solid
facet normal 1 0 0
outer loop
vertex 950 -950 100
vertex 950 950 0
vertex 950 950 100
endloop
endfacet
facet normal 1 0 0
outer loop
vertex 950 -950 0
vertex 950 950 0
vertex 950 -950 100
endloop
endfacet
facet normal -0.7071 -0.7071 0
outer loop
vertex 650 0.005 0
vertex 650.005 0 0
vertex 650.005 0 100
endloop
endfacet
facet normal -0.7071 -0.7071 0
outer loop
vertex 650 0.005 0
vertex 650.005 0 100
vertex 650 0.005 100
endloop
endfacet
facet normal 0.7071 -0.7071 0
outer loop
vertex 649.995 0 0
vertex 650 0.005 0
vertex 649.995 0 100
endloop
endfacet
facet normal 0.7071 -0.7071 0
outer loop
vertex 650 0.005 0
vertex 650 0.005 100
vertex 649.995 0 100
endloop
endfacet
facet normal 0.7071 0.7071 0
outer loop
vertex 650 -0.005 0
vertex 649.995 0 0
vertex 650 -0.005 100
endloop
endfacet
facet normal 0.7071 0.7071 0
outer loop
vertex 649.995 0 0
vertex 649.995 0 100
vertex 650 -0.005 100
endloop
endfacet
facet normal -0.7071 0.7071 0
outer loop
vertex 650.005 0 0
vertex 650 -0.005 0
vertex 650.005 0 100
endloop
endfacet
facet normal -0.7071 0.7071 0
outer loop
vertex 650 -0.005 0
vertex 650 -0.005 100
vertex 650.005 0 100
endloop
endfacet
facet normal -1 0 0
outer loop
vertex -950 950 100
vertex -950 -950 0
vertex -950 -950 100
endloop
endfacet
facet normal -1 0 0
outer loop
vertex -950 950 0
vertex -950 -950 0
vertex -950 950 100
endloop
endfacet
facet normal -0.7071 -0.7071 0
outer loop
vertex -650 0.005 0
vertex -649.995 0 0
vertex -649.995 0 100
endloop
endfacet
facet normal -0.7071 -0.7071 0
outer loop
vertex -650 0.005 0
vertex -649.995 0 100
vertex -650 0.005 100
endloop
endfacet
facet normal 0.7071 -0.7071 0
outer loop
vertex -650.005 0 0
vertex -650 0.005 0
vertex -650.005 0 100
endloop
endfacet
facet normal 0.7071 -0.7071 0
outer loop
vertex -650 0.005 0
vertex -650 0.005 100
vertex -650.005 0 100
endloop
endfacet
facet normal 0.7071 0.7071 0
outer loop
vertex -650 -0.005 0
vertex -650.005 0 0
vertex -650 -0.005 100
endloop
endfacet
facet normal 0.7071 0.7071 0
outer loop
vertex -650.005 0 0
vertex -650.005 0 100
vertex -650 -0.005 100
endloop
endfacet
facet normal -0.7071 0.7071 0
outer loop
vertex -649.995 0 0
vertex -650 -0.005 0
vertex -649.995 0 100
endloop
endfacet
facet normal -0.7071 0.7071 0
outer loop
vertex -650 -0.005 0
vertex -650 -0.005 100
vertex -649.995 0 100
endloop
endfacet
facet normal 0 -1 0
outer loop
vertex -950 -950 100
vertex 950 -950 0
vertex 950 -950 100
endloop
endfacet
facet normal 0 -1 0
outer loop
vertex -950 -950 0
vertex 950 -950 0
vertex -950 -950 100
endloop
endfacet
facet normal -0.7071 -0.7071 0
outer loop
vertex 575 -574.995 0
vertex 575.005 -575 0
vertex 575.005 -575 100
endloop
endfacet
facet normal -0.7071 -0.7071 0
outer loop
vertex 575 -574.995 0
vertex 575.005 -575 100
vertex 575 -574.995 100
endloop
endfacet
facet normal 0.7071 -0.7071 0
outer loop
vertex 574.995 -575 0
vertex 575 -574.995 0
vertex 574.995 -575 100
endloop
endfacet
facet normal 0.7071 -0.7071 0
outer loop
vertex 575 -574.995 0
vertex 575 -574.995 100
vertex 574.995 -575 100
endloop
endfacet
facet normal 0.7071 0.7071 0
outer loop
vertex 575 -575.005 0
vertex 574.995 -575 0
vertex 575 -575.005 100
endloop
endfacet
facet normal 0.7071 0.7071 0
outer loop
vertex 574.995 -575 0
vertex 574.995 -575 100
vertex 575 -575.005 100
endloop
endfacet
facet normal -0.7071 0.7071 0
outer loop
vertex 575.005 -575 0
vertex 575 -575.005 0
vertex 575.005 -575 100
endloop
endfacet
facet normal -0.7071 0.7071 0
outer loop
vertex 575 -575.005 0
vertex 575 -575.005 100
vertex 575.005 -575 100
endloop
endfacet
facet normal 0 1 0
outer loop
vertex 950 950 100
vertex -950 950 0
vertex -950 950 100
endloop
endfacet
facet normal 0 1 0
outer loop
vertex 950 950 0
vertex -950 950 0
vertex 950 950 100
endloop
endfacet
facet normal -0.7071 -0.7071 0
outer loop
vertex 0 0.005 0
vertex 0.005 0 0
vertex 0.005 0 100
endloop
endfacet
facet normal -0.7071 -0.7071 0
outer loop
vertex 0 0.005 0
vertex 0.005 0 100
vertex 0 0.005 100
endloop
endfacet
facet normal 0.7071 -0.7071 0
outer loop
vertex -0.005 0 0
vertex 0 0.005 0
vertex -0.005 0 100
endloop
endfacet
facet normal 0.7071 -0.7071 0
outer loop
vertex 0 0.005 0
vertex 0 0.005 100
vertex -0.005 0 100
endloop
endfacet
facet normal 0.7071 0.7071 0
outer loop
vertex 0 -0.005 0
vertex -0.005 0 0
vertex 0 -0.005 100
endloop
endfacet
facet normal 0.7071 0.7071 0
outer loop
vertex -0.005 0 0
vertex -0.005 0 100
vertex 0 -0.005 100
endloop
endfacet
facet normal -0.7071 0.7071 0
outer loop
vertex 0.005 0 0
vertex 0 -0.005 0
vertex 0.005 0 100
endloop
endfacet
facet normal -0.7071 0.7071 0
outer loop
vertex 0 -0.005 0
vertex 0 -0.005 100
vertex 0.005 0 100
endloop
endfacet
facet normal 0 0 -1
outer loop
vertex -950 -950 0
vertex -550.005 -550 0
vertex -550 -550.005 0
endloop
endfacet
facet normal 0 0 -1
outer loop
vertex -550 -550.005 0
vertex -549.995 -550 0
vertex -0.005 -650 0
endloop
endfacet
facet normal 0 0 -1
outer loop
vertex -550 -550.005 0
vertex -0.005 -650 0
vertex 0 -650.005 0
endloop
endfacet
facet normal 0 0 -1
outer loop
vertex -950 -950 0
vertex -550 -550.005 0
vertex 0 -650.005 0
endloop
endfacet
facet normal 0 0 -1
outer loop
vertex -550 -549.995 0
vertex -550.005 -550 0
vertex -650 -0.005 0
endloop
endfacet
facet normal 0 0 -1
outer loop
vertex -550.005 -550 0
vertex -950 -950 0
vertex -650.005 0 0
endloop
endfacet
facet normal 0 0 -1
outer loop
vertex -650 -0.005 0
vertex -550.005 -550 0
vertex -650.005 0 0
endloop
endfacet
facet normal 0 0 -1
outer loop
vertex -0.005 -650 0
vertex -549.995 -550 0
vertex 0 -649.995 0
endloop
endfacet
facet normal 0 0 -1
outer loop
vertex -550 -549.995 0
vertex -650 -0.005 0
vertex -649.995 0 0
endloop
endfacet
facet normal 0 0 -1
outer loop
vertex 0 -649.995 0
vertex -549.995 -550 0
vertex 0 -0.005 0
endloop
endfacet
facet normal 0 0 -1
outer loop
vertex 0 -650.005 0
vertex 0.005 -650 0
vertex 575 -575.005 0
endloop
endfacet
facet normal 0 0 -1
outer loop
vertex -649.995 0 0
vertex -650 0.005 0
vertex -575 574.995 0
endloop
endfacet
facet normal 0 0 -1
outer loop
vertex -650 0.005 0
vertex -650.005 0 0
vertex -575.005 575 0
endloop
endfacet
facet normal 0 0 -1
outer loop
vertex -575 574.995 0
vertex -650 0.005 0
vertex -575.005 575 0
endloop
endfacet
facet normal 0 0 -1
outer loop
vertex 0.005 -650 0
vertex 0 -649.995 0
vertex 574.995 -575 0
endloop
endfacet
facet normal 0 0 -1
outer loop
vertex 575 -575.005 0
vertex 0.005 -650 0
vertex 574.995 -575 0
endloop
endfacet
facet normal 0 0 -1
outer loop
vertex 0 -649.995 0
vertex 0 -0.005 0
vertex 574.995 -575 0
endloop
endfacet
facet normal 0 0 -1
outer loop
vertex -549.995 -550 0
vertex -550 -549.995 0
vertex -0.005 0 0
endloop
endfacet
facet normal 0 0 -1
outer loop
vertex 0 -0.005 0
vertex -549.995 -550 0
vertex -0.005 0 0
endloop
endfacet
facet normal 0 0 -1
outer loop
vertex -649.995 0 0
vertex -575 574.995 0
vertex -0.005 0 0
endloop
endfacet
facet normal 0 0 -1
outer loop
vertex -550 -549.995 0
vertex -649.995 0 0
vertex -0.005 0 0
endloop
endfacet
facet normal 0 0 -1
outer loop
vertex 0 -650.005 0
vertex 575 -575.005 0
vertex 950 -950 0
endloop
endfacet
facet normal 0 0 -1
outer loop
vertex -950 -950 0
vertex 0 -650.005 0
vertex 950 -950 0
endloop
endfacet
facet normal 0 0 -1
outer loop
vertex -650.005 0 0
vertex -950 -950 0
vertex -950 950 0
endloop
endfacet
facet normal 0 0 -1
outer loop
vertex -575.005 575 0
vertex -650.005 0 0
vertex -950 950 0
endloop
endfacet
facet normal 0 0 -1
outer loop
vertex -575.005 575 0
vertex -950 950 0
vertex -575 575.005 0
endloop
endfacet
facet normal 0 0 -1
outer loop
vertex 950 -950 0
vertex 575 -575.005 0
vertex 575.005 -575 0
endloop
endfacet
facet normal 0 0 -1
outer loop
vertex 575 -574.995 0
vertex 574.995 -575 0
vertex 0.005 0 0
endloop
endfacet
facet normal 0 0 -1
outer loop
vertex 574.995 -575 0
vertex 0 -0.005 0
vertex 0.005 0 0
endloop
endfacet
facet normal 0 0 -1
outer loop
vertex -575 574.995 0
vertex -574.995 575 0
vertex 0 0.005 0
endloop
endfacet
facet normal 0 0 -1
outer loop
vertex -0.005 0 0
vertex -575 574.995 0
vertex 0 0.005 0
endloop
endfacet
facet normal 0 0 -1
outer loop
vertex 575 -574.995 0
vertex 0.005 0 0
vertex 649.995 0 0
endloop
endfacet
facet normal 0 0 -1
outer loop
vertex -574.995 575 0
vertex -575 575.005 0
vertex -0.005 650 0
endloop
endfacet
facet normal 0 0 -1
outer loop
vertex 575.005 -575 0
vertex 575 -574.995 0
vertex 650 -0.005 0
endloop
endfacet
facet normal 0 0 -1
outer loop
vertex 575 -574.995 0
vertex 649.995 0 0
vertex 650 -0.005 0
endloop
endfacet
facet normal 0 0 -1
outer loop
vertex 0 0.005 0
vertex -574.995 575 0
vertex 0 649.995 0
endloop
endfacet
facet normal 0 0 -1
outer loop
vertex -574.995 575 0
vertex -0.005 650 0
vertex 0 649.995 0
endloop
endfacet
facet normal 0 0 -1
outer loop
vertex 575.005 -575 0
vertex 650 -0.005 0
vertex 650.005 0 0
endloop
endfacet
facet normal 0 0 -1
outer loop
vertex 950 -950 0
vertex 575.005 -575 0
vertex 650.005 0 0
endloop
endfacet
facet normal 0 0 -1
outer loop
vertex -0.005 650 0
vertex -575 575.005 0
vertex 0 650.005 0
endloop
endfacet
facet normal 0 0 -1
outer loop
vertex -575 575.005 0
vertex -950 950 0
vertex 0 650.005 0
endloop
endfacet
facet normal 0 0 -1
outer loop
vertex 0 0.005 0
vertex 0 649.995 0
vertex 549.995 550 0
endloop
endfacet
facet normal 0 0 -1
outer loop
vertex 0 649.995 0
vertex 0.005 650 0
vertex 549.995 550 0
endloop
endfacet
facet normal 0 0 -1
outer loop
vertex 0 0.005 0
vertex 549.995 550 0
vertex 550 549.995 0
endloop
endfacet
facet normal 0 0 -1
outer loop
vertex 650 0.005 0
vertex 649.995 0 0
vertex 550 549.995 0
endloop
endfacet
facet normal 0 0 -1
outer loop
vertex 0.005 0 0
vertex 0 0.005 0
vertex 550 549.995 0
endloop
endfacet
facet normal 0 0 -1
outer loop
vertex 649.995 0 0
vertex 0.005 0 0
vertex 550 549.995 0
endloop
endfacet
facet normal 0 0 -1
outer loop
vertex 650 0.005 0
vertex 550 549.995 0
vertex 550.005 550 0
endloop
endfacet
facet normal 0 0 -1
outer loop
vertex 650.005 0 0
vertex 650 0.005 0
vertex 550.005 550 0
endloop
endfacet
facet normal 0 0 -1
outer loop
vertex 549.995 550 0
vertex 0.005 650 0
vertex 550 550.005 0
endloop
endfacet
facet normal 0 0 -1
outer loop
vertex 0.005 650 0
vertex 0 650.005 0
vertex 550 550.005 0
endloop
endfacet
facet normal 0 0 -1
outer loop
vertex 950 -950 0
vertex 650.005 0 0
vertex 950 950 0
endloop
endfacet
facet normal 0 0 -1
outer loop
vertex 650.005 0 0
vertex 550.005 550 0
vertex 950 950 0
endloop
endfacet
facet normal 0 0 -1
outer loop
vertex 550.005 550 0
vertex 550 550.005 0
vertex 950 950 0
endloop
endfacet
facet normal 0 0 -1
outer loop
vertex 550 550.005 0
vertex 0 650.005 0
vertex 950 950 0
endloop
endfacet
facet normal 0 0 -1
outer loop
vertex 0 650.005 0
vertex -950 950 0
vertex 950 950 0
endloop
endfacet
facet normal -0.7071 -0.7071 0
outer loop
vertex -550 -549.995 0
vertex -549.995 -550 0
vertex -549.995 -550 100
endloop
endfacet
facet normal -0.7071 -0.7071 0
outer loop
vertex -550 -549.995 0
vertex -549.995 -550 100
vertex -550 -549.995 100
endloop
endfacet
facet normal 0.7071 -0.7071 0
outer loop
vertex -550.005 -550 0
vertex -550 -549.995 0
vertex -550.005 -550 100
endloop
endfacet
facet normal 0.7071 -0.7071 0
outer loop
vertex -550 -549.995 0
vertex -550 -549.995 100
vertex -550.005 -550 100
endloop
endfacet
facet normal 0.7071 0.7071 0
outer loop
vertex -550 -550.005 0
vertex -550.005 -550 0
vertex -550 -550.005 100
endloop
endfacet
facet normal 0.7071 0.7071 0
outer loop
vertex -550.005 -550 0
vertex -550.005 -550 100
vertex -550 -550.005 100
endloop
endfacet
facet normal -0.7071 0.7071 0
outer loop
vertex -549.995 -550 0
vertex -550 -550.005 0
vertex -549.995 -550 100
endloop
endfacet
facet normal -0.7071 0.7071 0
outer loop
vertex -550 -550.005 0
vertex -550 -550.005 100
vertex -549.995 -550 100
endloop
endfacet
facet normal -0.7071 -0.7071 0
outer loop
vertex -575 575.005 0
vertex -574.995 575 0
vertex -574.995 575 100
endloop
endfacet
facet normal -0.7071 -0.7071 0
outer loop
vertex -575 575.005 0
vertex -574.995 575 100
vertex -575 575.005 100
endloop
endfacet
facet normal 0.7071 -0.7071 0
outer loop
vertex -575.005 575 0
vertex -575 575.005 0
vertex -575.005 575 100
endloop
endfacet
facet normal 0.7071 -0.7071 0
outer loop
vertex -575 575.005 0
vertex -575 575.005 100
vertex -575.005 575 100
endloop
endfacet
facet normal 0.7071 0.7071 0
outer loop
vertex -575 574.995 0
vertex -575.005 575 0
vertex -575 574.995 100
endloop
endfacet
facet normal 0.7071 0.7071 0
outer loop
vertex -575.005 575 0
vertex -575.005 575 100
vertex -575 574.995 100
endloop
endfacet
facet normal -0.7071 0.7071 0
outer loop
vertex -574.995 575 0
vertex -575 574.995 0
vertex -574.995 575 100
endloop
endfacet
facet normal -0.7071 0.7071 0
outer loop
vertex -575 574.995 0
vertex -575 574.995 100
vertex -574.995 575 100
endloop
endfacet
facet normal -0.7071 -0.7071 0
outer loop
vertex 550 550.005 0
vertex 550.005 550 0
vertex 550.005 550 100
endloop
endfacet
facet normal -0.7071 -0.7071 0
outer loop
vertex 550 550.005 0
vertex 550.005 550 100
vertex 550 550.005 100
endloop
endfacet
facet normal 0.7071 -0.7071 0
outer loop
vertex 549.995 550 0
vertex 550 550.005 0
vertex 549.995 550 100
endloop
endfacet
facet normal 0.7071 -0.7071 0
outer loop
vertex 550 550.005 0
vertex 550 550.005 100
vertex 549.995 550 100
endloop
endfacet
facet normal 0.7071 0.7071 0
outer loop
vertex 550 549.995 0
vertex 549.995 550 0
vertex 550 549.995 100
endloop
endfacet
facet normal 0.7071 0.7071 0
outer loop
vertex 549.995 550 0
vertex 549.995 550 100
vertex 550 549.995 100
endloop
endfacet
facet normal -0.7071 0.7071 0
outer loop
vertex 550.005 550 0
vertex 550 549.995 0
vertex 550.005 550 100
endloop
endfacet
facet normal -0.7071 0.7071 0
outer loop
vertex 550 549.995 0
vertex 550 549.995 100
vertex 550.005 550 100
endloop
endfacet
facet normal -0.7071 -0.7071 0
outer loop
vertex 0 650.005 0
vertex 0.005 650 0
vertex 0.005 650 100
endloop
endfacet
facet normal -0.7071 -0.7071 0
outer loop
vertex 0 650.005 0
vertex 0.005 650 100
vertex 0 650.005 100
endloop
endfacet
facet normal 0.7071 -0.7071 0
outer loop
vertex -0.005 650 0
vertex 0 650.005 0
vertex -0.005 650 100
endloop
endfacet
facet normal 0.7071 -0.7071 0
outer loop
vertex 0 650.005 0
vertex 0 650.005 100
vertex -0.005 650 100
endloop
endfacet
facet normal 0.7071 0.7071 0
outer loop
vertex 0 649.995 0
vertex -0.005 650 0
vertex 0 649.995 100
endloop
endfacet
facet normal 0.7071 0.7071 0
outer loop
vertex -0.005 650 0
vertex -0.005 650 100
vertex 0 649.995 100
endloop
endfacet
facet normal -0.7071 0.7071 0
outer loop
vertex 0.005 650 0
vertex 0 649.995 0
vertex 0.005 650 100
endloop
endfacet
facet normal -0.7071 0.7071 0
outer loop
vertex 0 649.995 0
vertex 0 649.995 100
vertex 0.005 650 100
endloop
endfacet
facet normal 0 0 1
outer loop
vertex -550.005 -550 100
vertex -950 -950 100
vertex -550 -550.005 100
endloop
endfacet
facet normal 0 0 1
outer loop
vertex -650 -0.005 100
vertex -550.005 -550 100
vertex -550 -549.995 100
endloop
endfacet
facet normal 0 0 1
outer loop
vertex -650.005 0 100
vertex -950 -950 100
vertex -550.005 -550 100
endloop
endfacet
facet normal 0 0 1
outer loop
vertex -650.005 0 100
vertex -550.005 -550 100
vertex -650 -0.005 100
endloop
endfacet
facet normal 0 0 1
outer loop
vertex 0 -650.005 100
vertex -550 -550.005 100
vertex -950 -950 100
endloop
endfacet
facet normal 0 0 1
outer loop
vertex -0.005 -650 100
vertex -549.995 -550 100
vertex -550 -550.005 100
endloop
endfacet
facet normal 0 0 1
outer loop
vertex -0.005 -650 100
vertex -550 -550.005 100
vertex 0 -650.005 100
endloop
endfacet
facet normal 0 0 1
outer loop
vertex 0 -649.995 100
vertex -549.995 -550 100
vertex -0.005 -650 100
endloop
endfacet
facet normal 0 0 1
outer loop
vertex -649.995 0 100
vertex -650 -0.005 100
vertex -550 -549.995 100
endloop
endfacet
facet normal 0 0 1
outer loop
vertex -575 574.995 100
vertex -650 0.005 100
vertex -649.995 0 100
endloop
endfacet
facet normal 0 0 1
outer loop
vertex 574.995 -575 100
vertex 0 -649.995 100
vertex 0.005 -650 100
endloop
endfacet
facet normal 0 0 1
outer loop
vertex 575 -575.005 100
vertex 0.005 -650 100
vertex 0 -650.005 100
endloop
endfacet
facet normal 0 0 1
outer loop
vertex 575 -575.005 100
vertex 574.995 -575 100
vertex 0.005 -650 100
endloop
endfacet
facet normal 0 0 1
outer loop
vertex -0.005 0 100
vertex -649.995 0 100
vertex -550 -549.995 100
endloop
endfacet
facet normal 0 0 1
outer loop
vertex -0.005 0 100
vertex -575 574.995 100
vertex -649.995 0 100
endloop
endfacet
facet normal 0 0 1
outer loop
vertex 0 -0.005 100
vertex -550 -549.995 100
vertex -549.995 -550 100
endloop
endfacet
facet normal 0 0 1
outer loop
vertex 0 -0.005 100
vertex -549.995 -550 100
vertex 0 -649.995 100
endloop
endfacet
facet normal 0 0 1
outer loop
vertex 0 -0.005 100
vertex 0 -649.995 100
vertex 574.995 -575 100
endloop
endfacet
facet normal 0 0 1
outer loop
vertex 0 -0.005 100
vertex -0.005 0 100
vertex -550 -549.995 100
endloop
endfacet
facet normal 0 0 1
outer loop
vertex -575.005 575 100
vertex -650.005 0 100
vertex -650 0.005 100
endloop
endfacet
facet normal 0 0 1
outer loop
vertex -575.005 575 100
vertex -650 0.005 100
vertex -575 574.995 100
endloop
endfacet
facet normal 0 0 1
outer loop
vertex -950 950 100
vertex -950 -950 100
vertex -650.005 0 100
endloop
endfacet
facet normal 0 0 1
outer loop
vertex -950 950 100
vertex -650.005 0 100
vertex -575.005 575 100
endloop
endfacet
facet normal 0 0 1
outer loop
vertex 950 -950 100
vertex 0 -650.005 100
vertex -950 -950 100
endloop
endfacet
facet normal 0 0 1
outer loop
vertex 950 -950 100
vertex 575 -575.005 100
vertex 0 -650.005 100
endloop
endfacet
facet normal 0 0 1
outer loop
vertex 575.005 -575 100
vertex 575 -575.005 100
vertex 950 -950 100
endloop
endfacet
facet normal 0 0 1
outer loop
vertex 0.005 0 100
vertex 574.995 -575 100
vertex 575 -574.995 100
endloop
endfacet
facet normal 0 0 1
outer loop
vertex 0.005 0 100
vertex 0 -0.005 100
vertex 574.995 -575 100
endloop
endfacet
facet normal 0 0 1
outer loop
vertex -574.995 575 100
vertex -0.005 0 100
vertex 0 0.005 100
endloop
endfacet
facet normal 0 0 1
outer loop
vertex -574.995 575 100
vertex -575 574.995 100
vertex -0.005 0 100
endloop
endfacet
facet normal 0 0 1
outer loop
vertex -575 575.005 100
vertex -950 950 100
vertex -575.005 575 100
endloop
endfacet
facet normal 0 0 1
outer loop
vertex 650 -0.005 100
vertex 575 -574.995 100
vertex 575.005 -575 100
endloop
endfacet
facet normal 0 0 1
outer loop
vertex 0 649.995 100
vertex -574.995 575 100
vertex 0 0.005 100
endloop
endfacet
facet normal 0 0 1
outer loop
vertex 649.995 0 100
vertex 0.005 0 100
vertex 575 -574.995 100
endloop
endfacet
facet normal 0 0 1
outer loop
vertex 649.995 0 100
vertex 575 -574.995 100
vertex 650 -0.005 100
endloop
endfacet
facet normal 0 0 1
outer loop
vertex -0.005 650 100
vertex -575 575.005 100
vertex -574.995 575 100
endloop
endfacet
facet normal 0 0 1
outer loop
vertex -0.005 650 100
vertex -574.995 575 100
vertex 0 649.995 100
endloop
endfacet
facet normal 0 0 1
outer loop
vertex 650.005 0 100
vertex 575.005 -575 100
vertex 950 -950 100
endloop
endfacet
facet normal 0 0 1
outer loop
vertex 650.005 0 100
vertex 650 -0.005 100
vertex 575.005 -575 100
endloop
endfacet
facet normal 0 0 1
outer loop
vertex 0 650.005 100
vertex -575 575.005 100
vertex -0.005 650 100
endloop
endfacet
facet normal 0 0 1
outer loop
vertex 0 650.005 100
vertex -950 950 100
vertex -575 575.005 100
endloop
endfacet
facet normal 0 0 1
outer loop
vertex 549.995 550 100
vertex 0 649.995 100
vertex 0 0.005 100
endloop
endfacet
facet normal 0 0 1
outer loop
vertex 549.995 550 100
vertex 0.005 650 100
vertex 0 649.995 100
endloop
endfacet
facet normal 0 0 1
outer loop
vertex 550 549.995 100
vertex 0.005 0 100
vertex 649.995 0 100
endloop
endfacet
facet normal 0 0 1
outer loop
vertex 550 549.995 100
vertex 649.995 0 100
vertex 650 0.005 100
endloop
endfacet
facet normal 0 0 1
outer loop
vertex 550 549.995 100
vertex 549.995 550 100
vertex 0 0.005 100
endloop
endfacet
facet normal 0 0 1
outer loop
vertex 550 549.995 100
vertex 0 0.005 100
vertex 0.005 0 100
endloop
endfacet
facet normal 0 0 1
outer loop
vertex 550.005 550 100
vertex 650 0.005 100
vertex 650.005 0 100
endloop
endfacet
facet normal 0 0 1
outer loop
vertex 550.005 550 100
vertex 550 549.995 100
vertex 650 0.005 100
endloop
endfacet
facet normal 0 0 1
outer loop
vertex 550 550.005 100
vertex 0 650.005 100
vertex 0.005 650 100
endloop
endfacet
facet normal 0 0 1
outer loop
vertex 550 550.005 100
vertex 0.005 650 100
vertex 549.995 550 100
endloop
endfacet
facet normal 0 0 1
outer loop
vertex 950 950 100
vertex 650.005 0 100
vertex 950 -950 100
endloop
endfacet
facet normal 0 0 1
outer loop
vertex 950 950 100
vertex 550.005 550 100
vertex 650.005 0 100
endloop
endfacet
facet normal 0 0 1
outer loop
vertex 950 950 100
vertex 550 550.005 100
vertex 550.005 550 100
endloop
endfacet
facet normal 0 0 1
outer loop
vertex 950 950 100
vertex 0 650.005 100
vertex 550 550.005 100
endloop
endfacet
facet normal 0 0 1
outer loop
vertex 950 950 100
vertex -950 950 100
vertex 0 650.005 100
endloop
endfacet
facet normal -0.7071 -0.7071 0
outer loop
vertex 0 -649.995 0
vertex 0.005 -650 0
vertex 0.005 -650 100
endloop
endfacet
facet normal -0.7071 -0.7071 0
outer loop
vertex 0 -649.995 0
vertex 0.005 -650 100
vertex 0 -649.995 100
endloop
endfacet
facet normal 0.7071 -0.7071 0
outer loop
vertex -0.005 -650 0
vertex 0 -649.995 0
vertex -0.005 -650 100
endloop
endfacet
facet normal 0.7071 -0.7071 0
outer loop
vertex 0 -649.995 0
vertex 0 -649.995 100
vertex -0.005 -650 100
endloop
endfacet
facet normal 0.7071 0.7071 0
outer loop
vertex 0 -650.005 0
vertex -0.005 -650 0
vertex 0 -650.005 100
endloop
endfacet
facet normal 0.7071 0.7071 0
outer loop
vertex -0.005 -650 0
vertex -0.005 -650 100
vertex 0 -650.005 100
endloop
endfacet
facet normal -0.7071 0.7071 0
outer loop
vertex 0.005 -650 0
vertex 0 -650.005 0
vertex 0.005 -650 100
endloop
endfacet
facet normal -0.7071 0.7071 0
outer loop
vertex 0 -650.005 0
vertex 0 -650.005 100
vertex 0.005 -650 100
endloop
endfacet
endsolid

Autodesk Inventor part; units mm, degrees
ref_plane "YZ Plane" through (0, 0, 0) normal (1, 0, 0) x (0, 1, 0)
ref_plane "XZ Plane" through (0, 0, 0) normal (0, 1, 0) x (-1, 0, 0)
ref_plane "XY Plane" through (0, 0, 0) normal (0, 0, 1) x (1, 0, 0)
sketch "スケッチ1" plane through (0, 0, 0) normal (0, 0, 1) x (1, 0, 0)
  line L0 (-950, -950) -> (-950, 950)
  line L1 (-950, 950) -> (950, 950)
  line L2 (950, 950) -> (950, -950)
  line L3 (950, -950) -> (-950, -950)
  point P0 (0, 0)
  point P1 (0, 0)
  dimension "d0" = 1900
extrude "押し出し1" add sketch "スケッチ1" along normal blind 100
sketch "スケッチ3" plane through (0, 0, 100) normal (0, 0, 1) x (1, 0, 0)
  circle A0 centre (0, 0) radius 0.005
  line L0 (-950, 950) -> (-950, -950) projected
  line L1 (-950, -950) -> (950, -950) projected
  line L2 (950, -950) -> (950, 950) projected
  line L3 (950, 950) -> (-950, 950) projected
  line L4 (-950, 950) -> (-950, 575)
  line L5 (-950, 950) -> (-950, -950) projected
  line L6 (-950, 575) -> (-575, 575)
  circle A1 centre (-575, 575) radius 0.005
  line L7 (950, -950) -> (950, -575)
  line L8 (950, -950) -> (950, 950) projected
  line L9 (950, -575) -> (575, -575)
  circle A2 centre (575, -575) radius 0.005
  line L10 (-950, -950) -> (0, -950)
  line L11 (0, -950) -> (0, -650)
  circle A3 centre (0, -650) radius 0.005
  line L12 (950, 950) -> (0, 950)
  line L13 (950, 950) -> (-950, 950) projected
  line L14 (0, 950) -> (0, 650)
  circle A4 centre (0, 650) radius 0.005
  line L15 (-950, -950) -> (-550, -950)
  line L16 (-950, -950) -> (950, -950) projected
  line L17 (-550, -950) -> (-550, -550)
  circle A5 centre (-550, -550) radius 0.005
  line L18 (950, 950) -> (550, 950)
  line L19 (550, 950) -> (550, 550)
  circle A6 centre (550, 550) radius 0.005
  line L20 (-950, -950) -> (-950, 0)
  line L21 (-950, 0) -> (-650, 0)
  line L22 (950, 950) -> (950, 0)
  line L23 (950, 0) -> (650, 0)
  circle A7 centre (-650, 0) radius 0.005
  circle A8 centre (650, 0) radius 0.005
  dimension "d8" = 0.01
  dimension "d9" = 375
  dimension "d10" = 375
  dimension "d11" = 0.01
  dimension "d12" = 375
  dimension "d13" = 375
  dimension "d14" = 0.01
  dimension "d15" = 300
  dimension "d16" = 0.01
  dimension "d17" = 300
  dimension "d18" = 0.01
  dimension "d19" = 400
  dimension "d20" = 400
  dimension "d21" = 0.01
  dimension "d22" = 400
  dimension "d23" = 400
  dimension "d24" = 0.01
  dimension "d25" = 300
  dimension "d26" = 300
  dimension "d27" = 0.01
  dimension "d28" = 0.01
sketch "スケッチ3 outline for 押し出し2" plane through (0, 0, 100) normal (0, 0, 1) x (1, 0, 0)
  circle A0 centre (0, 0) radius 0.005
  circle A1 centre (-575, 575) radius 0.005
  circle A2 centre (575, -575) radius 0.005
  circle A3 centre (0, -650) radius 0.005
  circle A4 centre (0, 650) radius 0.005
  circle A5 centre (-550, -550) radius 0.005
  circle A6 centre (550, 550) radius 0.005
  circle A7 centre (-650, 0) radius 0.005
  circle A8 centre (650, 0) radius 0.005
extrude "押し出し2" cut sketch "スケッチ3 outline for 押し出し2" against normal blind 100
properties part number "リング"
